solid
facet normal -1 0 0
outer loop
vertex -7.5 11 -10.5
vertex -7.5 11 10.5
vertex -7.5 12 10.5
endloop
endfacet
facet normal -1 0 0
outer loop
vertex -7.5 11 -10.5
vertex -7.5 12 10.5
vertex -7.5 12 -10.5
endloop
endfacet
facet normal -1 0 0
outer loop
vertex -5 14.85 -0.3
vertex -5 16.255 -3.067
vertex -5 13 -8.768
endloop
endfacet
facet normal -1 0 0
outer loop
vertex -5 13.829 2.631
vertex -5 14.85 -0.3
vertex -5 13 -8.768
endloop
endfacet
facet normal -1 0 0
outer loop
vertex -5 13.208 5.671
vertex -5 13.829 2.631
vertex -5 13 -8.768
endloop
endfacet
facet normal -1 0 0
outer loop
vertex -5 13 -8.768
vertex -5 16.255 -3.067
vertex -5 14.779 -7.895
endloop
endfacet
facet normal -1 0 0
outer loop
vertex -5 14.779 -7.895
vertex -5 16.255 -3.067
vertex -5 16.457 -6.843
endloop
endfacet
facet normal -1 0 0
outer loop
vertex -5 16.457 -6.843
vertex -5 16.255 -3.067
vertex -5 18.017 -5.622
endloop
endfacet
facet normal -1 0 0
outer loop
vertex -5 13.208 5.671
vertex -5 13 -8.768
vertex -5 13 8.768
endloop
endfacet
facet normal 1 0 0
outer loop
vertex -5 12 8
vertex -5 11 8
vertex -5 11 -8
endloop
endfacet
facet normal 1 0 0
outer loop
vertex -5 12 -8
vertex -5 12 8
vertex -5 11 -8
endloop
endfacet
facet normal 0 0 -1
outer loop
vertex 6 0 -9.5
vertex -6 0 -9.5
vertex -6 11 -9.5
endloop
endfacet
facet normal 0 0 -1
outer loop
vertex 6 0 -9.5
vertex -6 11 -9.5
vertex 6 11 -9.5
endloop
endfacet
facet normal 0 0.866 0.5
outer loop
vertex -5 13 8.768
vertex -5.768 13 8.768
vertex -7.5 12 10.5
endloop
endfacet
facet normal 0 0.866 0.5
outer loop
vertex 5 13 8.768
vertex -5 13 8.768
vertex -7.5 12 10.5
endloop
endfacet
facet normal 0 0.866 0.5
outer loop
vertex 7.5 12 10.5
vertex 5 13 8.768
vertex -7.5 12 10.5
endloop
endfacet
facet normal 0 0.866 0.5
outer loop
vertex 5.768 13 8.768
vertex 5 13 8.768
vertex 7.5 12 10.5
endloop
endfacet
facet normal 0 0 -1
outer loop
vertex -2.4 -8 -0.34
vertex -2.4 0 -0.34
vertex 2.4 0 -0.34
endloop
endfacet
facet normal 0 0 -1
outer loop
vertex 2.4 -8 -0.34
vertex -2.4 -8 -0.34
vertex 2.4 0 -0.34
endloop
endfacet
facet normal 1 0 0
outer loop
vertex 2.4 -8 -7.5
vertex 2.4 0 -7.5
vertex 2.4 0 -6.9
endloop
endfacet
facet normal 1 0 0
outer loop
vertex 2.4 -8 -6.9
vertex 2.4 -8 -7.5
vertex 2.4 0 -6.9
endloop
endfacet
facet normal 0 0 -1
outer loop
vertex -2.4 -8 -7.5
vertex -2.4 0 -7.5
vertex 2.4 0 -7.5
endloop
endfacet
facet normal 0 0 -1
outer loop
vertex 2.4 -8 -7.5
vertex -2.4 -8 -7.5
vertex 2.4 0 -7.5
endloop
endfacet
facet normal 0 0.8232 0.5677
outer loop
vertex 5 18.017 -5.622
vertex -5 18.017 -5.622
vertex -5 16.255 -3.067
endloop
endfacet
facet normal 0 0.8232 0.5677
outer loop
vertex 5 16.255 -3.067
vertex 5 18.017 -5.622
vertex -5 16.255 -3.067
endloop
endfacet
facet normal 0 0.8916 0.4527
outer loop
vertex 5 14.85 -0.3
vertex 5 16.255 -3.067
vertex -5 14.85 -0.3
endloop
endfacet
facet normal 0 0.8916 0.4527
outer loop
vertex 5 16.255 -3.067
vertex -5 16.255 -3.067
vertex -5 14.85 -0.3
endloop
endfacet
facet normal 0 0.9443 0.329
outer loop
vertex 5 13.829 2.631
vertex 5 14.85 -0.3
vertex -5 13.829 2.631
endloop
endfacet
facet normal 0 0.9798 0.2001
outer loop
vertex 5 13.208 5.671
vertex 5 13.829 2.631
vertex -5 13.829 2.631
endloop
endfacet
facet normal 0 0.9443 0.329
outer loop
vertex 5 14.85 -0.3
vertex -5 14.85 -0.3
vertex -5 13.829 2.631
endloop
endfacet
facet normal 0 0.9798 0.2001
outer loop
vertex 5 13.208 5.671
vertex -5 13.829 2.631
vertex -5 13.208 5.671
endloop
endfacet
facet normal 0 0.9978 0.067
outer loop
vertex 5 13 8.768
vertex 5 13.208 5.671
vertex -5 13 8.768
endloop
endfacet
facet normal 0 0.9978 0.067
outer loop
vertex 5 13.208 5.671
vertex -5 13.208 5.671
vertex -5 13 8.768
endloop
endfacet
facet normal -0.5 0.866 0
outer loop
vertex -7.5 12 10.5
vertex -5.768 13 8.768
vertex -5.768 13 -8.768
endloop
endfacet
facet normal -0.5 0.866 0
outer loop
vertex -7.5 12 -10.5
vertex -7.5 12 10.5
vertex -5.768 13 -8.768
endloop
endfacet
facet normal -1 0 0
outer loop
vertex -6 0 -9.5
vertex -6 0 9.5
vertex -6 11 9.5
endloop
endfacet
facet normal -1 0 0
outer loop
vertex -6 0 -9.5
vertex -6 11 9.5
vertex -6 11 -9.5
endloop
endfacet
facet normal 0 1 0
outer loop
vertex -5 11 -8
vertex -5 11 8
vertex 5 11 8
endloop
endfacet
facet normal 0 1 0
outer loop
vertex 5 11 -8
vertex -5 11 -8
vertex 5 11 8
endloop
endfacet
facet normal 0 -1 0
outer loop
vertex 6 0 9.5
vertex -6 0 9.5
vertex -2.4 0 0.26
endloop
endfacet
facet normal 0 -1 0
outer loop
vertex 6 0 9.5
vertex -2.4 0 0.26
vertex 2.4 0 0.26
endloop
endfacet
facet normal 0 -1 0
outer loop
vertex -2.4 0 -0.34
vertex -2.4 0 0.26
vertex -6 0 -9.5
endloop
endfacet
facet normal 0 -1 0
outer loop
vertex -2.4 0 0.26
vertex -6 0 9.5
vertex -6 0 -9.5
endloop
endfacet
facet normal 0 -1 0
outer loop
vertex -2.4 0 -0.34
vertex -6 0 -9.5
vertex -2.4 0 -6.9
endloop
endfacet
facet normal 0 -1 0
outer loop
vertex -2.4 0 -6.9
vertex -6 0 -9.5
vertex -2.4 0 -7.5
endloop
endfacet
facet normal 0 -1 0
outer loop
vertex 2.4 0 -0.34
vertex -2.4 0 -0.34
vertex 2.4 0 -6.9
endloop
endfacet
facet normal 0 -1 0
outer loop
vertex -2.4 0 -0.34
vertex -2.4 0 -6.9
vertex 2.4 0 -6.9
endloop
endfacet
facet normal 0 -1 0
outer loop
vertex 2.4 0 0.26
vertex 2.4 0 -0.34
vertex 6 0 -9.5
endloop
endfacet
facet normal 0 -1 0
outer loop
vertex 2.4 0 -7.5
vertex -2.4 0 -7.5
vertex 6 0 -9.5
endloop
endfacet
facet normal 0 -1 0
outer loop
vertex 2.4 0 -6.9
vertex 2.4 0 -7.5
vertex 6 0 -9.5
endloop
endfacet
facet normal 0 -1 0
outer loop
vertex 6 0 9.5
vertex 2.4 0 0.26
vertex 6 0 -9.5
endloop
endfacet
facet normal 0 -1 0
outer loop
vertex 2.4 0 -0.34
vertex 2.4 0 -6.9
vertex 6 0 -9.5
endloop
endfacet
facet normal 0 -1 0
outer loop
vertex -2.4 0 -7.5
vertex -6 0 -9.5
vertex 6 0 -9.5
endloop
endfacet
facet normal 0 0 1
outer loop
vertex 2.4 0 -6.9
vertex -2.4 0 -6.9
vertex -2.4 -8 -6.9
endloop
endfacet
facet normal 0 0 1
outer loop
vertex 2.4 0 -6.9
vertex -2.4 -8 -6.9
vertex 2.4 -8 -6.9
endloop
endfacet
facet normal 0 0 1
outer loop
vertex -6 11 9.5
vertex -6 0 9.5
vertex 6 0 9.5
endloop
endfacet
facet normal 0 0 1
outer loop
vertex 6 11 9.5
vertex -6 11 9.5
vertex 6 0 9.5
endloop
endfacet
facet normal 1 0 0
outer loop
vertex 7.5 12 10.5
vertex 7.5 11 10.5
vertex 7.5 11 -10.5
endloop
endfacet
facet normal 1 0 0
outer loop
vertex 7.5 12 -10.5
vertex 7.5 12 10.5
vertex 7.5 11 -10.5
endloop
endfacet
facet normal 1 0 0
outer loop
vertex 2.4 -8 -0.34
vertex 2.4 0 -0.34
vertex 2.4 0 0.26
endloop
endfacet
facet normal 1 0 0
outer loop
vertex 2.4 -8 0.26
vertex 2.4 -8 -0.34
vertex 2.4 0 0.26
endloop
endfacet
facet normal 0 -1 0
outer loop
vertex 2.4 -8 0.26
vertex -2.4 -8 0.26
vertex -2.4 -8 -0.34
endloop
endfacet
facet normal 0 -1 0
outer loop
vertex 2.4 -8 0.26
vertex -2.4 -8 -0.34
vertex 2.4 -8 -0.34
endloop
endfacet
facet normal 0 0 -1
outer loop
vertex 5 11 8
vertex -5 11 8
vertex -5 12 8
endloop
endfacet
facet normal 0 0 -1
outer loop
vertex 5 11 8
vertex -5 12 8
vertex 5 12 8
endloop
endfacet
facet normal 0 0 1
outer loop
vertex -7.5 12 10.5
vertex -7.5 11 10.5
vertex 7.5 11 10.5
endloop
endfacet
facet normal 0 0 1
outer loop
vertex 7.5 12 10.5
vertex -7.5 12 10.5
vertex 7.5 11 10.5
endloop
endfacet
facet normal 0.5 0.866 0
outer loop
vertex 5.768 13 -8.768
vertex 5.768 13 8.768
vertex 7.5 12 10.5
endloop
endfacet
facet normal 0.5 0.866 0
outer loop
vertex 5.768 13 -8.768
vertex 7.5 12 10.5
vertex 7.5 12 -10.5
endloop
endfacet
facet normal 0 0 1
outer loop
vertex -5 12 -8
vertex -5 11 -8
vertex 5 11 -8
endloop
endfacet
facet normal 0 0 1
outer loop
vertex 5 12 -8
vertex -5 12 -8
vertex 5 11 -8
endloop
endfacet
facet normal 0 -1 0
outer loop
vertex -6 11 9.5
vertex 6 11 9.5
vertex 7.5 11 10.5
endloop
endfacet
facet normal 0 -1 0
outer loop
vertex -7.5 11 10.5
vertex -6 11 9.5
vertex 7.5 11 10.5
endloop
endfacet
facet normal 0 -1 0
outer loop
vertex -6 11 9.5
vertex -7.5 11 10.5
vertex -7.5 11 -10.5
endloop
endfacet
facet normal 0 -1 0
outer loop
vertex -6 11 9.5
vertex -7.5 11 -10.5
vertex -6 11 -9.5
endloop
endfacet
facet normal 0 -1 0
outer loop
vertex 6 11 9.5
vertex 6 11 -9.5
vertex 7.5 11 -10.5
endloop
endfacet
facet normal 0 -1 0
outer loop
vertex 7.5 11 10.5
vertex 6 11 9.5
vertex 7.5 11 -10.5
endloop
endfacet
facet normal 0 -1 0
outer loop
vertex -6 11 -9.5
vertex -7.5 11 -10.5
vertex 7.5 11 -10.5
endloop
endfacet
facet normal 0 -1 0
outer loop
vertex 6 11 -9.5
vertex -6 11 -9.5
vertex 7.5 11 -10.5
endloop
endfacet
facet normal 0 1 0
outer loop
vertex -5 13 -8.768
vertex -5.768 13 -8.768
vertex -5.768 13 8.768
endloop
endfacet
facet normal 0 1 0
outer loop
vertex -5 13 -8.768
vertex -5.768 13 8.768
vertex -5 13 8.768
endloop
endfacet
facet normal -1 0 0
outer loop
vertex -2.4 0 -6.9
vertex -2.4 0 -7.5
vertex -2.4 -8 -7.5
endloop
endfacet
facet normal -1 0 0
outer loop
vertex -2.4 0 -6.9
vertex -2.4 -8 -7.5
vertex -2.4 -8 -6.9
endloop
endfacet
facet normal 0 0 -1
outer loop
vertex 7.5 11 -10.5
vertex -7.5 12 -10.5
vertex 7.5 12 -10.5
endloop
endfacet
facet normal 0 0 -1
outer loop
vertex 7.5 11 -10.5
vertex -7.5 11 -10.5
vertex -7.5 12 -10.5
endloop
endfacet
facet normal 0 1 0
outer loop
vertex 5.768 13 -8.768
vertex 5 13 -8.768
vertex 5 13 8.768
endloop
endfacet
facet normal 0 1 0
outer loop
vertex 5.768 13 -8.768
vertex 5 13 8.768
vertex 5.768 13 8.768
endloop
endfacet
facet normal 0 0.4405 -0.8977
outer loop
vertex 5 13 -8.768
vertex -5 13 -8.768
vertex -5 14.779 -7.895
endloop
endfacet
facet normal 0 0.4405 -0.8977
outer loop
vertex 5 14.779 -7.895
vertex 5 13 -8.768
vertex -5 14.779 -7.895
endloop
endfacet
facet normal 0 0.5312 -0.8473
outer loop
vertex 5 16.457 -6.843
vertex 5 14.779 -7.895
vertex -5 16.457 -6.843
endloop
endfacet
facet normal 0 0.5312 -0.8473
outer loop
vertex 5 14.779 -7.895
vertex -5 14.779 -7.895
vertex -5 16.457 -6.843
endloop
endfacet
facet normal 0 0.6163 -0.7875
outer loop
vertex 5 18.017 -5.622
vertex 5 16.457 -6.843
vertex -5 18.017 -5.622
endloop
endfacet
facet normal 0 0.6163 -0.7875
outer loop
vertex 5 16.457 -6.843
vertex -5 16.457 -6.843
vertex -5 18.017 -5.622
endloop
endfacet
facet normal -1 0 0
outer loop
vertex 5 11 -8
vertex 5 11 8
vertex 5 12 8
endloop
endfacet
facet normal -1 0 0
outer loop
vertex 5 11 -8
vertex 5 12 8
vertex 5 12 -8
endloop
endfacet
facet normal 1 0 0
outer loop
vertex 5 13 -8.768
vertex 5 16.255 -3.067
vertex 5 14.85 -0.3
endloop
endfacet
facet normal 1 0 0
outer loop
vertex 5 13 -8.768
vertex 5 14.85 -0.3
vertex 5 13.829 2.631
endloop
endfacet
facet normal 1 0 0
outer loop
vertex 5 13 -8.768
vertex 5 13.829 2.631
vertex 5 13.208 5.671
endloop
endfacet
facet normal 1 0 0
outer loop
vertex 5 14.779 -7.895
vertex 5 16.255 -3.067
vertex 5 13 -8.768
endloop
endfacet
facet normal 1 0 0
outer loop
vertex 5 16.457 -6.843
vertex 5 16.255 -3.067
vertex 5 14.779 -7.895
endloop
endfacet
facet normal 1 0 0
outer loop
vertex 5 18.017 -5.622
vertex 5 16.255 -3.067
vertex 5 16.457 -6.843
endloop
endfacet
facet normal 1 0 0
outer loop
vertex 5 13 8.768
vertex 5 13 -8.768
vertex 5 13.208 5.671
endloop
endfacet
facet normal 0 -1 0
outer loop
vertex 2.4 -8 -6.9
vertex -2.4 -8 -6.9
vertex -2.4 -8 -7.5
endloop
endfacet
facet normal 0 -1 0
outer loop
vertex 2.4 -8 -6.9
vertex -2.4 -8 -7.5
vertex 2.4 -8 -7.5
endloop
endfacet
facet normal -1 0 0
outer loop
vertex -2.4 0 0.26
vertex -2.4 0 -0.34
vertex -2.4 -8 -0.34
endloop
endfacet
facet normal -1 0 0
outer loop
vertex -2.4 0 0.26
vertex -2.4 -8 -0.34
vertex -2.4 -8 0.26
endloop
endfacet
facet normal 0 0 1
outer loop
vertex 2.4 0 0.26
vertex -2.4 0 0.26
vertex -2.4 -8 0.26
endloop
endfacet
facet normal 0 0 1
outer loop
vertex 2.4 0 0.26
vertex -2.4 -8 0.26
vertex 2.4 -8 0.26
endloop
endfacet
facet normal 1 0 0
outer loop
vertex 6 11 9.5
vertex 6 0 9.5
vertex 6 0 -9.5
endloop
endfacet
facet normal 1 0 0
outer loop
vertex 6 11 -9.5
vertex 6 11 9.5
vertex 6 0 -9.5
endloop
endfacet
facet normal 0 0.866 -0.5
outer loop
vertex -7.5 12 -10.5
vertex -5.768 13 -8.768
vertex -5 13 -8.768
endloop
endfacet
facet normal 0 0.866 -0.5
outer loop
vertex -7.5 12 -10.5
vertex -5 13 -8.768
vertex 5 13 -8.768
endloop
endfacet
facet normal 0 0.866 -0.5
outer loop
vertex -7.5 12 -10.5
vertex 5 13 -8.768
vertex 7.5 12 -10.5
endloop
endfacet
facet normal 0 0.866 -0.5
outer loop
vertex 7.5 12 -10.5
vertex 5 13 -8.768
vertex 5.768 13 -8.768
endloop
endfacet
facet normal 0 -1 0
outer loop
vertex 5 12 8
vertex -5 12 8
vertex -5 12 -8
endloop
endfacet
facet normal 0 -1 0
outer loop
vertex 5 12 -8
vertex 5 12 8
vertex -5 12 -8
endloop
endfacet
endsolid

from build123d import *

# Parameters (mm, degrees)
SKETCH1_W             = 12
SKETCH1_H             = 19
BOSS_EXTRUDE1_DEPTH   = 11
SKETCH2_W             = 15
SKETCH2_H             = 21
SKETCH2_W_2           = 10
SKETCH2_H_2           = 16
BOSS_EXTRUDE2_DEPTH   = 2
CHAMFER1_SIZE         = 1
CHAMFER1_SIZE2        = 1.732050808
CHAMFER1_PART_2_SIZE  = 1
CHAMFER1_PART_2_SIZE2 = 1.732050808
CHAMFER1_PART_3_SIZE  = 1
CHAMFER1_PART_3_SIZE2 = 1.732050808
CHAMFER1_PART_4_SIZE  = 1
CHAMFER1_PART_4_SIZE2 = 1.732050808
BOSS_EXTRUDE3_DEPTH   = 10
SKETCH4_W             = 4.8
SKETCH4_H             = 0.6
BOSS_EXTRUDE4_DEPTH   = 8


with BuildPart() as part:
    # Sketch1 → Boss-Extrude1 (new body)
    with BuildSketch(Plane(origin=(0, 0, 0), x_dir=(1, 0, 0), z_dir=(0, 1, 0))):
        Rectangle(SKETCH1_W, SKETCH1_H)
    extrude(amount=BOSS_EXTRUDE1_DEPTH)

    # Sketch2 → Boss-Extrude2 (add)
    with BuildSketch(Plane(origin=(0, 11, 0), x_dir=(1, 0, 0), z_dir=(0, 1, 0))):
        Rectangle(SKETCH2_W, SKETCH2_H)
        Rectangle(SKETCH2_W_2, SKETCH2_H_2, mode=Mode.SUBTRACT)
    extrude(amount=BOSS_EXTRUDE2_DEPTH)

    # Chamfer1
    chamfer1_edges = [part.edges().sort_by_distance(p)[0] for p in [
        (-7.5, 13, 0),
    ]]
    chamfer1_side = [part.faces().sort_by_distance(p)[0] for p in [
        (-7.5, 12, 0),
    ]]
    chamfer(chamfer1_edges, length=CHAMFER1_SIZE, length2=CHAMFER1_SIZE2, reference=chamfer1_side[0])

    # Chamfer1 part 2
    chamfer1_part_2_edges = [part.edges().sort_by_distance(p)[0] for p in [
        (0, 13, 10.5),
    ]]
    chamfer1_part_2_side = [part.faces().sort_by_distance(p)[0] for p in [
        (0, 12, 10.5),
    ]]
    chamfer(chamfer1_part_2_edges, length=CHAMFER1_PART_2_SIZE, length2=CHAMFER1_PART_2_SIZE2, reference=chamfer1_part_2_side[0])

    # Chamfer1 part 3
    chamfer1_part_3_edges = [part.edges().sort_by_distance(p)[0] for p in [
        (7.5, 13, 0),
    ]]
    chamfer1_part_3_side = [part.faces().sort_by_distance(p)[0] for p in [
        (7.5, 12, 0),
    ]]
    chamfer(chamfer1_part_3_edges, length=CHAMFER1_PART_3_SIZE, length2=CHAMFER1_PART_3_SIZE2, reference=chamfer1_part_3_side[0])

    # Chamfer1 part 4
    chamfer1_part_4_edges = [part.edges().sort_by_distance(p)[0] for p in [
        (0, 13, -10.5),
    ]]
    chamfer1_part_4_side = [part.faces().sort_by_distance(p)[0] for p in [
        (0, 12, -10.5),
    ]]
    chamfer(chamfer1_part_4_edges, length=CHAMFER1_PART_4_SIZE, length2=CHAMFER1_PART_4_SIZE2, reference=chamfer1_part_4_side[0])

    # Sketch3 → Boss-Extrude3 (add)
    with BuildSketch(Plane(origin=(-5, 0, 0), x_dir=(0, 0, -1), z_dir=(1, 0, 0))):
        with BuildLine():
            Line((-8.767949192, 13), (-8.767949192, 12))
            Line((-8.767949192, 12), (9.162687499, 12))
            ThreePointArc((9.162687499, 12), (7.670106688, 15.172024144), (5.622167077, 18.017279493))
            ThreePointArc((5.622167077, 18.017279493), (-1.14809782, 14.290285439), (-8.767949192, 13))
        make_face()
    extrude(amount=BOSS_EXTRUDE3_DEPTH)

    # Sketch4 → Boss-Extrude4 (add)
    with BuildSketch(Plane.XZ):
        with Locations((0, -7.2)):
            Rectangle(SKETCH4_W, SKETCH4_H)
        with Locations((0, -0.04)):
            Rectangle(SKETCH4_W, SKETCH4_H)
    extrude(amount=BOSS_EXTRUDE4_DEPTH)


solid = part.part
